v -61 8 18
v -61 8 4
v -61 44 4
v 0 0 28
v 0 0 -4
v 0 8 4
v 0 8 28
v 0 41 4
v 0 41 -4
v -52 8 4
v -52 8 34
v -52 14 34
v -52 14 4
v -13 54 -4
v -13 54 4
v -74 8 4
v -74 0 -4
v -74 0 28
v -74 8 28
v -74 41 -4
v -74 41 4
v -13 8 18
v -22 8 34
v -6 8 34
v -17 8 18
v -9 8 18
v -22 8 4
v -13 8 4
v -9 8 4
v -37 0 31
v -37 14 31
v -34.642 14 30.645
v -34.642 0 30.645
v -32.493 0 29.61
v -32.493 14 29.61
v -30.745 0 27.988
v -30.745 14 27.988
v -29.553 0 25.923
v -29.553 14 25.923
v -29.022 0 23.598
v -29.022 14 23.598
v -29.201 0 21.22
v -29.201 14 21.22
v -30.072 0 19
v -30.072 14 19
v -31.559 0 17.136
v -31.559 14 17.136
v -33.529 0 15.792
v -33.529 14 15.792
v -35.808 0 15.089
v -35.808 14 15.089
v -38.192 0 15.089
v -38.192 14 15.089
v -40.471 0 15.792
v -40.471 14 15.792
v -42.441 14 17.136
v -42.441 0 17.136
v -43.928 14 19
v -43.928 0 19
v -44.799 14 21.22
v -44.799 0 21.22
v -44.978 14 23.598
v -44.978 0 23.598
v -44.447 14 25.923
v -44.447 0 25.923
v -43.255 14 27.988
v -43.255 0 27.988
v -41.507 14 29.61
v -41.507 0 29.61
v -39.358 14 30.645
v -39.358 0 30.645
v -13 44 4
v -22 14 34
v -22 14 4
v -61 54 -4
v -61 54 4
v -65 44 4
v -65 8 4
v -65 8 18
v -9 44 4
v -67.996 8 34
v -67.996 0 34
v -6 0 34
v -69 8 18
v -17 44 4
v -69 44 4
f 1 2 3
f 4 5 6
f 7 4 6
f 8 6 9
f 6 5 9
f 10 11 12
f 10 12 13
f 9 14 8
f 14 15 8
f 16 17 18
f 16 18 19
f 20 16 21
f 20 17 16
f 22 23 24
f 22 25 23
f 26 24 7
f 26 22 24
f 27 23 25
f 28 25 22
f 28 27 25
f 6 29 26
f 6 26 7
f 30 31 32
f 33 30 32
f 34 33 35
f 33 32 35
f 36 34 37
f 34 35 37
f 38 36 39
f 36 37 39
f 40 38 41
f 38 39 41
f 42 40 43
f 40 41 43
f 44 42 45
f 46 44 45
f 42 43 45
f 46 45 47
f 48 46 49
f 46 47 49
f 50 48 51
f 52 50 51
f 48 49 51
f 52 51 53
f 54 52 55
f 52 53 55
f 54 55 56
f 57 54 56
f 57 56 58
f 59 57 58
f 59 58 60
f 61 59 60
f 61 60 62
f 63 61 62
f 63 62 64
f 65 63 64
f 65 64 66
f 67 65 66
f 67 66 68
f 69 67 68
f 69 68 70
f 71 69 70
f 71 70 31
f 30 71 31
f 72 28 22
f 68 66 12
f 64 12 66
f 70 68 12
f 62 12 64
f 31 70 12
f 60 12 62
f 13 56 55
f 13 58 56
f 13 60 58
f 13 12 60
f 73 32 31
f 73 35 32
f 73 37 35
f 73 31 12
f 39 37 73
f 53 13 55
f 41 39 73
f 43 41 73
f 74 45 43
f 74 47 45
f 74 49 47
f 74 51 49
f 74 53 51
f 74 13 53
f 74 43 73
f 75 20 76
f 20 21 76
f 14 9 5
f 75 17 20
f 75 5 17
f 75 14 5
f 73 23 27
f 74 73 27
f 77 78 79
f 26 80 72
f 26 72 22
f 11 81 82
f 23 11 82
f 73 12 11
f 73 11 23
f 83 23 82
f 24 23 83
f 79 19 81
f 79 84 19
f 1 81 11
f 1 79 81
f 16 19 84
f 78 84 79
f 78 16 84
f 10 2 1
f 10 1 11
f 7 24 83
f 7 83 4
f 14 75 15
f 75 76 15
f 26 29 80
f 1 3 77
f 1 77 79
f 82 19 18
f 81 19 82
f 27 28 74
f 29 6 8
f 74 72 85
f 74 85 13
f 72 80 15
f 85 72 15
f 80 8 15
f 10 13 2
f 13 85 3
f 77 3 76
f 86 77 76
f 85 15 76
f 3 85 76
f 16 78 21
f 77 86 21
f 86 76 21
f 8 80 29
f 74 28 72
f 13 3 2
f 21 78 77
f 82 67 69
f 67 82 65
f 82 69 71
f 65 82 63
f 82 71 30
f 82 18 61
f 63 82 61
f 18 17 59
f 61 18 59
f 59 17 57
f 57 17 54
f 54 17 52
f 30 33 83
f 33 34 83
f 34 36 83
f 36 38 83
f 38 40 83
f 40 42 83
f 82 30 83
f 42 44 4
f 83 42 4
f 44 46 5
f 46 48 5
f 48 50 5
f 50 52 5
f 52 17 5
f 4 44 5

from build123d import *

# Parameters (mm, degrees)
BOSS_EXTRUDE4_DEPTH  = 4
SKETCH5_W            = 74
SKETCH5_H            = 8
BOSS_EXTRUDE5_DEPTH  = 30
SKETCH6_W            = 4
SKETCH6_H            = 36
BOSS_EXTRUDE6_DEPTH  = 18
CUT_EXTRUDE2_DEPTH   = 18
SKETCH9_W            = 30
SKETCH9_H            = 30
BOSS_EXTRUDE11_DEPTH = 6
SKETCH10_R           = 8
CUT_EXTRUDE3_DEPTH   = 50
CUT_EXTRUDE4_DEPTH   = 8
CUT_EXTRUDE5_DEPTH   = 8


with BuildPart() as part:
    # Sketch1 → Boss-Extrude4 (new, symmetric)
    with BuildSketch(Plane.XY):
        Polygon((-74, 0), (-74, 41), (-61, 54), (-13, 54), (0, 41), (0, 0), align=None)
    extrude(amount=BOSS_EXTRUDE4_DEPTH, both=True)

    # Sketch5 → Boss-Extrude5 (add)
    with BuildSketch(Plane.XY.offset(4)):
        with Locations((-37, 4)):
            Rectangle(SKETCH5_W, SKETCH5_H)
    extrude(amount=BOSS_EXTRUDE5_DEPTH)

    # Sketch6 → Boss-Extrude6 (add)
    with BuildSketch(Plane.XY):
        with Locations((-63, 26)):
            Rectangle(SKETCH6_W, SKETCH6_H)
        with Locations((-11, 26)):
            Rectangle(SKETCH6_W, SKETCH6_H)
    extrude(amount=BOSS_EXTRUDE6_DEPTH)

    # Sketch8 → Cut-Extrude2 (cut)
    with BuildSketch(Plane(origin=(0, 8, 0), x_dir=(1, 0, 0), z_dir=(0, 1, 0))):
        Polygon((-74, -28), (-67.996452301, -34), (-74, -34), align=None)
        Polygon((0, -34), (-6, -34), (0, -28), align=None)
    extrude(amount=-CUT_EXTRUDE2_DEPTH, mode=Mode.SUBTRACT)

    # Sketch9 → Boss-Extrude11 (add)
    with BuildSketch(Plane(origin=(0, 8, 0), x_dir=(1, 0, 0), z_dir=(0, 1, 0))):
        with Locations((-37, -19)):
            Rectangle(SKETCH9_W, SKETCH9_H)
    extrude(amount=BOSS_EXTRUDE11_DEPTH)

    # Sketch10 → Cut-Extrude3 (cut)
    with BuildSketch(Plane(origin=(0, 14, 0), x_dir=(1, 0, 0), z_dir=(0, 1, 0))):
        with Locations(Location((-37, -23, 0), (0, 0, 270))):
            Circle(SKETCH10_R)
    extrude(amount=-CUT_EXTRUDE3_DEPTH, mode=Mode.SUBTRACT)

    # Sketch11 → Cut-Extrude4 (cut)
    with BuildSketch(Plane(origin=(-9, 0, 0), x_dir=(0, 0, -1), z_dir=(1, 0, 0))):
        Polygon((-4, 44), (-18, 8), (-18, 44), align=None)
    extrude(amount=-CUT_EXTRUDE4_DEPTH, mode=Mode.SUBTRACT)

    # Sketch12 → Cut-Extrude5 (cut)
    with BuildSketch(Plane(origin=(-61, 0, 0), x_dir=(0, 0, -1), z_dir=(1, 0, 0))):
        Polygon((-4, 44), (-18, 8), (-18, 44), align=None)
    extrude(amount=-CUT_EXTRUDE5_DEPTH, mode=Mode.SUBTRACT)


solid = part.part
